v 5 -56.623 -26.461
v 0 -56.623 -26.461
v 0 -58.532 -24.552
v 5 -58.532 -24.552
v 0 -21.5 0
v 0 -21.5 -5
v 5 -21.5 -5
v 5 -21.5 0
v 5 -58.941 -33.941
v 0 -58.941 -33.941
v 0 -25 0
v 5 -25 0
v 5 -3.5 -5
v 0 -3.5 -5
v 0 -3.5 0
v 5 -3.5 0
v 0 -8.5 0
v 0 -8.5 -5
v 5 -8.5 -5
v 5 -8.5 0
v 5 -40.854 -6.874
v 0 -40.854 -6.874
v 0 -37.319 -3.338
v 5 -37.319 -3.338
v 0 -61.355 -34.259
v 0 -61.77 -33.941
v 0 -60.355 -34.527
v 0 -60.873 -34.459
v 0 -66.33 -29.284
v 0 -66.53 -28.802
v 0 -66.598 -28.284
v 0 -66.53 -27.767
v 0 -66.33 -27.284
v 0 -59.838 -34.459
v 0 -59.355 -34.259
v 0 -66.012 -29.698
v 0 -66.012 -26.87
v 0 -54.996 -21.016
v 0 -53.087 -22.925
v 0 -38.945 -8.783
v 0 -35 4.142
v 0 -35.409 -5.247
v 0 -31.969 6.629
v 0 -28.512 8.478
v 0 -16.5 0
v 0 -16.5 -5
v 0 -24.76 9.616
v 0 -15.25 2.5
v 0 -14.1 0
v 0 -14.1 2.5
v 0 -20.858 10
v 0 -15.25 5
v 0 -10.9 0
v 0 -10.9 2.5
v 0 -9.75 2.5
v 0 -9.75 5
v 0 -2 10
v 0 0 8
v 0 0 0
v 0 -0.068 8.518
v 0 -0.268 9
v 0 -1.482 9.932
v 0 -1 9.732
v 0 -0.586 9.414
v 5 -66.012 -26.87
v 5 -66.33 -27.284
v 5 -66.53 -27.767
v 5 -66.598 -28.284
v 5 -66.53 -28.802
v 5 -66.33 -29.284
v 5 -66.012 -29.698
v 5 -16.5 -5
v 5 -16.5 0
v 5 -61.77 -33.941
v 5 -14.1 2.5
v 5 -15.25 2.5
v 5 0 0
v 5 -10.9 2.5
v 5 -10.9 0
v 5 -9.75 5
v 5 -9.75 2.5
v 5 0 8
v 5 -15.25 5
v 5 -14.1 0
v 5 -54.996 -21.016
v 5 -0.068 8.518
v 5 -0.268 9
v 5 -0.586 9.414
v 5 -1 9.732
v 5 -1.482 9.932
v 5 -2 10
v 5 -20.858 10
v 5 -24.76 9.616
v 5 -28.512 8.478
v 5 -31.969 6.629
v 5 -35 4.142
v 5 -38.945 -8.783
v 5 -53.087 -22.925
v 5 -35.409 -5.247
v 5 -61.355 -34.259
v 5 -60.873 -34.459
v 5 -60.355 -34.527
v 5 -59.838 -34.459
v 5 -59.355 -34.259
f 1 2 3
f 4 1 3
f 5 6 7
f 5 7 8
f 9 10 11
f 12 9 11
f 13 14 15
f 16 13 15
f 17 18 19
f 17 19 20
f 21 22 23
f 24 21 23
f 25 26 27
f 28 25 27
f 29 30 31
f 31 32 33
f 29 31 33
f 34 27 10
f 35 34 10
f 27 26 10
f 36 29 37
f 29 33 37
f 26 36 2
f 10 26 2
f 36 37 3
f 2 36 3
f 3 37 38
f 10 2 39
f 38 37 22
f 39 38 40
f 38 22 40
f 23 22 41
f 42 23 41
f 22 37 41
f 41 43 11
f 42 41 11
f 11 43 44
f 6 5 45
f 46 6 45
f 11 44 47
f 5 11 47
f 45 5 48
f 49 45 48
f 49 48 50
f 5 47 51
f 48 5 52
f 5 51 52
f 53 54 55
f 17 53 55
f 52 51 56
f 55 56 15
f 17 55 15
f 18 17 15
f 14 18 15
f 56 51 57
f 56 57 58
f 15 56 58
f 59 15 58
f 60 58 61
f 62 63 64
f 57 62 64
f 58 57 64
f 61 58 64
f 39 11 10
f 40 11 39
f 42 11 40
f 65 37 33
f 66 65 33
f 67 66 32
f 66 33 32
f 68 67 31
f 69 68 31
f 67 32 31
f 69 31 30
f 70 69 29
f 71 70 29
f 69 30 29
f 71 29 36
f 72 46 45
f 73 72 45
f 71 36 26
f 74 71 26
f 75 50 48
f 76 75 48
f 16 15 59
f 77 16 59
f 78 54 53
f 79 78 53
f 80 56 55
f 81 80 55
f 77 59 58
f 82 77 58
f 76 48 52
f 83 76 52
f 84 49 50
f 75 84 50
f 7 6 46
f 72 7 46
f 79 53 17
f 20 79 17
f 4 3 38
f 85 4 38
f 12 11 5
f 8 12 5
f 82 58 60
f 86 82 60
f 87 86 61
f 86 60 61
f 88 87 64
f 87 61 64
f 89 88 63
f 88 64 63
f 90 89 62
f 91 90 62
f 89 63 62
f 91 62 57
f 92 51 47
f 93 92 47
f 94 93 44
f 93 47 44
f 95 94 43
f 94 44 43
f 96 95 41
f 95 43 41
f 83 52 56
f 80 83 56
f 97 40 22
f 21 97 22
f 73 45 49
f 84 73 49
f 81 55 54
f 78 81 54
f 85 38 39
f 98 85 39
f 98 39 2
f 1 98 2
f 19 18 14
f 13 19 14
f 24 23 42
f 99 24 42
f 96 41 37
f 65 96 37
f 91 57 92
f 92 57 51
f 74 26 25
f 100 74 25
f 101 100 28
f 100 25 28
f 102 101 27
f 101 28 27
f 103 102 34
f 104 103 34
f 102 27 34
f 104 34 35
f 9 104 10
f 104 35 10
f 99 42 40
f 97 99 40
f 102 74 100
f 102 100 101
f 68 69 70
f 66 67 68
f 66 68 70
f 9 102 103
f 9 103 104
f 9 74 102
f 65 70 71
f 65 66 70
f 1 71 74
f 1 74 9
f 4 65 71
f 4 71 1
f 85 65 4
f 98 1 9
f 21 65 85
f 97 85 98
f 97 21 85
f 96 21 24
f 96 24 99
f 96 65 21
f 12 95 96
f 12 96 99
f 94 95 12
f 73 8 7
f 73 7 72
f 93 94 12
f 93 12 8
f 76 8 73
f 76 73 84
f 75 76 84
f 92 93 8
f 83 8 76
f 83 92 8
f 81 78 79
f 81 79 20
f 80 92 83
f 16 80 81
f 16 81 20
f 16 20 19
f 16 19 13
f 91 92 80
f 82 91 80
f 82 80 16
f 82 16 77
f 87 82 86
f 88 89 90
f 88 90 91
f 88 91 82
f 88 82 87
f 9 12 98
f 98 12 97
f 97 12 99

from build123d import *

# Parameters (mm, degrees)
F1_W     = 5
F1_H     = 5
F2_DEPTH = 5


with BuildPart() as f2:
    # F1 (on Right) → F2 (new body)
    with BuildSketch(Plane.YZ):
        with BuildLine():
            Line((-3.5, 0), (0, 0))
            Line((0, 0), (0, 8))
            ThreePointArc((0, 8), (-0.5857864376, 9.4142135624), (-2, 10))
            Line((-2, 10), (-20.8578643763, 10))
            ThreePointArc((-20.8578643763, 10), (-28.5115330236, 8.4775906502), (-35, 4.1421356237))
            Line((-35, 4.1421356237), (-66.0121933088, -26.8700576851))
            ThreePointArc((-66.0121933088, -26.8700576851), (-66.5979797464, -28.2842712475), (-66.0121933088, -29.6984848098))
            Line((-66.0121933088, -29.6984848098), (-61.7695526217, -33.941125497))
            ThreePointArc((-61.7695526217, -33.941125497), (-60.3553390593, -34.5269119346), (-58.941125497, -33.941125497))
            Line((-58.941125497, -33.941125497), (-25, 0))
            Line((-25, 0), (-21.5, 0))
            Line((-21.5, 0), (-16.5, 0))
            Line((-16.5, 0), (-14.1, 0))
            Line((-14.1, 0), (-14.1, 2.5))
            Line((-14.1, 2.5), (-15.25, 2.5))
            Line((-15.25, 2.5), (-15.25, 5))
            Line((-15.25, 5), (-12.5, 5))
            Line((-12.5, 5), (-9.75, 5))
            Line((-9.75, 5), (-9.75, 2.5))
            Line((-9.75, 2.5), (-10.9, 2.5))
            Line((-10.9, 2.5), (-10.9, 0))
            Line((-10.9, 0), (-8.5, 0))
            Line((-8.5, 0), (-3.5, 0))
        make_face()
        Polygon((-56.6225703117, -26.460690809), (-58.5317586209, -24.5515024998), (-54.9962247149, -21.0159685939), (-53.0870364057, -22.9251569031), align=None, mode=Mode.SUBTRACT)
        Polygon((-40.8540890912, -6.8738329701), (-37.3185551853, -3.3382990642), (-35.4093668761, -5.2474873734), (-38.944900782, -8.7830212793), align=None, mode=Mode.SUBTRACT)
        with Locations((-6, -2.5)):
            Rectangle(F1_W, F1_H)
        with Locations((-19, -2.5)):
            Rectangle(F1_W, F1_H)
    extrude(amount=F2_DEPTH)


solid = f2.part
